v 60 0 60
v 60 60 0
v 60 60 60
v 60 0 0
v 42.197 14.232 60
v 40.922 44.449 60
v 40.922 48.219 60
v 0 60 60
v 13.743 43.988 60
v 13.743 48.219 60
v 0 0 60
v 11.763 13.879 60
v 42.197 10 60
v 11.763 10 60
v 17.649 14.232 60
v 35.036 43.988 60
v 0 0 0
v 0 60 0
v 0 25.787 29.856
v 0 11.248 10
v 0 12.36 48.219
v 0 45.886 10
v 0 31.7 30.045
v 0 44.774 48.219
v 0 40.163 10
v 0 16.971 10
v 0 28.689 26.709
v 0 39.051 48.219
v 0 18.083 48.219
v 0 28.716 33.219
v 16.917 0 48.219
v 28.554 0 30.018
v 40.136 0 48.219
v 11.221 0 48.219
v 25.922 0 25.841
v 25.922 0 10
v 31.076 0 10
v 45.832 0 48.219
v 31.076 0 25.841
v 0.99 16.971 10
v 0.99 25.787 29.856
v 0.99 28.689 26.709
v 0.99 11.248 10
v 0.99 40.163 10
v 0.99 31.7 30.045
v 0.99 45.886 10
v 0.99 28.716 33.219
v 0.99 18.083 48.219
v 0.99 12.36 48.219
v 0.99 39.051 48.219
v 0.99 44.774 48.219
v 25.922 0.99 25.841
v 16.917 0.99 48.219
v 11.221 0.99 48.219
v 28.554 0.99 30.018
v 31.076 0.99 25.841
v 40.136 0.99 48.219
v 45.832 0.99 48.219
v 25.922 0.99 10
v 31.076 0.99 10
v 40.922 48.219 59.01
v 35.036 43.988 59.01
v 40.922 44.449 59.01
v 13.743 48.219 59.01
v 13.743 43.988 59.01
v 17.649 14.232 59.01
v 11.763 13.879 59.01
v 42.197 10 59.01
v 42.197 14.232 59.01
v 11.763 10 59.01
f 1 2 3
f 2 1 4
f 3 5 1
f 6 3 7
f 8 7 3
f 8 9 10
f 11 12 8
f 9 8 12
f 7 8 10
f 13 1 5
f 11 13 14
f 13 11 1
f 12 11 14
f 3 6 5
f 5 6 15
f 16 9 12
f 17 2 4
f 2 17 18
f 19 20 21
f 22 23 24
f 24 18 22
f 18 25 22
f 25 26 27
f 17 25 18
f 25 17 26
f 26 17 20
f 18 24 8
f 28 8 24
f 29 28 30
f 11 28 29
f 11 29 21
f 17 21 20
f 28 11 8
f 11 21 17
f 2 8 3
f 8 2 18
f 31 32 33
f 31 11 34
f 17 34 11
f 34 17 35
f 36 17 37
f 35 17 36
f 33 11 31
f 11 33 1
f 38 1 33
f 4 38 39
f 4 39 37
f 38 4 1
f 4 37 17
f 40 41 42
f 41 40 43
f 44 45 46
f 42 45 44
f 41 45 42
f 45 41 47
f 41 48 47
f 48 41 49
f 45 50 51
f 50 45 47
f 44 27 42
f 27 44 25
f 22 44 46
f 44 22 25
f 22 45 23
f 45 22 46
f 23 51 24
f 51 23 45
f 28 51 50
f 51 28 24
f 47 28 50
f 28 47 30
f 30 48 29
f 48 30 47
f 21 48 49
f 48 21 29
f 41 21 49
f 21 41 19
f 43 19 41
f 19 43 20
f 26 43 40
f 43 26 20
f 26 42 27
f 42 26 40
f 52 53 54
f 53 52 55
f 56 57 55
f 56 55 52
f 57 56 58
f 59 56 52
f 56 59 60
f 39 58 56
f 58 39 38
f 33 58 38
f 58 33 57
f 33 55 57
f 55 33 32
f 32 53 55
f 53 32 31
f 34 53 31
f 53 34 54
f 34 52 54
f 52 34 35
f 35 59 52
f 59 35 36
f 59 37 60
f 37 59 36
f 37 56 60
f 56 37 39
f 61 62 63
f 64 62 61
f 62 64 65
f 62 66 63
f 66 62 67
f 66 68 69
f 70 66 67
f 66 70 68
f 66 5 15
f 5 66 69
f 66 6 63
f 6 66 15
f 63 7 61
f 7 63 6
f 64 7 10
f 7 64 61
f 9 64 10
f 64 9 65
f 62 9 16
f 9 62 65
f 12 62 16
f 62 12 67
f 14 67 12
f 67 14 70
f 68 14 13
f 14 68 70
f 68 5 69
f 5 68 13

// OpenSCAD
//http://github.com/DavidTre07
//Dice size in mm
size=60;

//Do not modify under this line
letterSize=size/1.5;
letterThin=1;
$fn=300;
epsilon=0.01;

difference(){
   cube(size=size);
   translate([-epsilon,(size-letterSize)/2,(size-letterSize)/2])rotate([90,0,90])
      linear_extrude(height=letterThin)text("X",size=letterSize);
   translate([(size-letterSize)/2,letterThin-epsilon,(size-letterSize)/2])rotate([90,0,0])
      linear_extrude(height=letterThin)text("Y",size=letterSize);
   translate([(size-letterSize)/2,(size-letterSize)/2,size-letterThin+epsilon])rotate([0,0,0])
      linear_extrude(height=letterThin)text("Z",size=letterSize);
}
